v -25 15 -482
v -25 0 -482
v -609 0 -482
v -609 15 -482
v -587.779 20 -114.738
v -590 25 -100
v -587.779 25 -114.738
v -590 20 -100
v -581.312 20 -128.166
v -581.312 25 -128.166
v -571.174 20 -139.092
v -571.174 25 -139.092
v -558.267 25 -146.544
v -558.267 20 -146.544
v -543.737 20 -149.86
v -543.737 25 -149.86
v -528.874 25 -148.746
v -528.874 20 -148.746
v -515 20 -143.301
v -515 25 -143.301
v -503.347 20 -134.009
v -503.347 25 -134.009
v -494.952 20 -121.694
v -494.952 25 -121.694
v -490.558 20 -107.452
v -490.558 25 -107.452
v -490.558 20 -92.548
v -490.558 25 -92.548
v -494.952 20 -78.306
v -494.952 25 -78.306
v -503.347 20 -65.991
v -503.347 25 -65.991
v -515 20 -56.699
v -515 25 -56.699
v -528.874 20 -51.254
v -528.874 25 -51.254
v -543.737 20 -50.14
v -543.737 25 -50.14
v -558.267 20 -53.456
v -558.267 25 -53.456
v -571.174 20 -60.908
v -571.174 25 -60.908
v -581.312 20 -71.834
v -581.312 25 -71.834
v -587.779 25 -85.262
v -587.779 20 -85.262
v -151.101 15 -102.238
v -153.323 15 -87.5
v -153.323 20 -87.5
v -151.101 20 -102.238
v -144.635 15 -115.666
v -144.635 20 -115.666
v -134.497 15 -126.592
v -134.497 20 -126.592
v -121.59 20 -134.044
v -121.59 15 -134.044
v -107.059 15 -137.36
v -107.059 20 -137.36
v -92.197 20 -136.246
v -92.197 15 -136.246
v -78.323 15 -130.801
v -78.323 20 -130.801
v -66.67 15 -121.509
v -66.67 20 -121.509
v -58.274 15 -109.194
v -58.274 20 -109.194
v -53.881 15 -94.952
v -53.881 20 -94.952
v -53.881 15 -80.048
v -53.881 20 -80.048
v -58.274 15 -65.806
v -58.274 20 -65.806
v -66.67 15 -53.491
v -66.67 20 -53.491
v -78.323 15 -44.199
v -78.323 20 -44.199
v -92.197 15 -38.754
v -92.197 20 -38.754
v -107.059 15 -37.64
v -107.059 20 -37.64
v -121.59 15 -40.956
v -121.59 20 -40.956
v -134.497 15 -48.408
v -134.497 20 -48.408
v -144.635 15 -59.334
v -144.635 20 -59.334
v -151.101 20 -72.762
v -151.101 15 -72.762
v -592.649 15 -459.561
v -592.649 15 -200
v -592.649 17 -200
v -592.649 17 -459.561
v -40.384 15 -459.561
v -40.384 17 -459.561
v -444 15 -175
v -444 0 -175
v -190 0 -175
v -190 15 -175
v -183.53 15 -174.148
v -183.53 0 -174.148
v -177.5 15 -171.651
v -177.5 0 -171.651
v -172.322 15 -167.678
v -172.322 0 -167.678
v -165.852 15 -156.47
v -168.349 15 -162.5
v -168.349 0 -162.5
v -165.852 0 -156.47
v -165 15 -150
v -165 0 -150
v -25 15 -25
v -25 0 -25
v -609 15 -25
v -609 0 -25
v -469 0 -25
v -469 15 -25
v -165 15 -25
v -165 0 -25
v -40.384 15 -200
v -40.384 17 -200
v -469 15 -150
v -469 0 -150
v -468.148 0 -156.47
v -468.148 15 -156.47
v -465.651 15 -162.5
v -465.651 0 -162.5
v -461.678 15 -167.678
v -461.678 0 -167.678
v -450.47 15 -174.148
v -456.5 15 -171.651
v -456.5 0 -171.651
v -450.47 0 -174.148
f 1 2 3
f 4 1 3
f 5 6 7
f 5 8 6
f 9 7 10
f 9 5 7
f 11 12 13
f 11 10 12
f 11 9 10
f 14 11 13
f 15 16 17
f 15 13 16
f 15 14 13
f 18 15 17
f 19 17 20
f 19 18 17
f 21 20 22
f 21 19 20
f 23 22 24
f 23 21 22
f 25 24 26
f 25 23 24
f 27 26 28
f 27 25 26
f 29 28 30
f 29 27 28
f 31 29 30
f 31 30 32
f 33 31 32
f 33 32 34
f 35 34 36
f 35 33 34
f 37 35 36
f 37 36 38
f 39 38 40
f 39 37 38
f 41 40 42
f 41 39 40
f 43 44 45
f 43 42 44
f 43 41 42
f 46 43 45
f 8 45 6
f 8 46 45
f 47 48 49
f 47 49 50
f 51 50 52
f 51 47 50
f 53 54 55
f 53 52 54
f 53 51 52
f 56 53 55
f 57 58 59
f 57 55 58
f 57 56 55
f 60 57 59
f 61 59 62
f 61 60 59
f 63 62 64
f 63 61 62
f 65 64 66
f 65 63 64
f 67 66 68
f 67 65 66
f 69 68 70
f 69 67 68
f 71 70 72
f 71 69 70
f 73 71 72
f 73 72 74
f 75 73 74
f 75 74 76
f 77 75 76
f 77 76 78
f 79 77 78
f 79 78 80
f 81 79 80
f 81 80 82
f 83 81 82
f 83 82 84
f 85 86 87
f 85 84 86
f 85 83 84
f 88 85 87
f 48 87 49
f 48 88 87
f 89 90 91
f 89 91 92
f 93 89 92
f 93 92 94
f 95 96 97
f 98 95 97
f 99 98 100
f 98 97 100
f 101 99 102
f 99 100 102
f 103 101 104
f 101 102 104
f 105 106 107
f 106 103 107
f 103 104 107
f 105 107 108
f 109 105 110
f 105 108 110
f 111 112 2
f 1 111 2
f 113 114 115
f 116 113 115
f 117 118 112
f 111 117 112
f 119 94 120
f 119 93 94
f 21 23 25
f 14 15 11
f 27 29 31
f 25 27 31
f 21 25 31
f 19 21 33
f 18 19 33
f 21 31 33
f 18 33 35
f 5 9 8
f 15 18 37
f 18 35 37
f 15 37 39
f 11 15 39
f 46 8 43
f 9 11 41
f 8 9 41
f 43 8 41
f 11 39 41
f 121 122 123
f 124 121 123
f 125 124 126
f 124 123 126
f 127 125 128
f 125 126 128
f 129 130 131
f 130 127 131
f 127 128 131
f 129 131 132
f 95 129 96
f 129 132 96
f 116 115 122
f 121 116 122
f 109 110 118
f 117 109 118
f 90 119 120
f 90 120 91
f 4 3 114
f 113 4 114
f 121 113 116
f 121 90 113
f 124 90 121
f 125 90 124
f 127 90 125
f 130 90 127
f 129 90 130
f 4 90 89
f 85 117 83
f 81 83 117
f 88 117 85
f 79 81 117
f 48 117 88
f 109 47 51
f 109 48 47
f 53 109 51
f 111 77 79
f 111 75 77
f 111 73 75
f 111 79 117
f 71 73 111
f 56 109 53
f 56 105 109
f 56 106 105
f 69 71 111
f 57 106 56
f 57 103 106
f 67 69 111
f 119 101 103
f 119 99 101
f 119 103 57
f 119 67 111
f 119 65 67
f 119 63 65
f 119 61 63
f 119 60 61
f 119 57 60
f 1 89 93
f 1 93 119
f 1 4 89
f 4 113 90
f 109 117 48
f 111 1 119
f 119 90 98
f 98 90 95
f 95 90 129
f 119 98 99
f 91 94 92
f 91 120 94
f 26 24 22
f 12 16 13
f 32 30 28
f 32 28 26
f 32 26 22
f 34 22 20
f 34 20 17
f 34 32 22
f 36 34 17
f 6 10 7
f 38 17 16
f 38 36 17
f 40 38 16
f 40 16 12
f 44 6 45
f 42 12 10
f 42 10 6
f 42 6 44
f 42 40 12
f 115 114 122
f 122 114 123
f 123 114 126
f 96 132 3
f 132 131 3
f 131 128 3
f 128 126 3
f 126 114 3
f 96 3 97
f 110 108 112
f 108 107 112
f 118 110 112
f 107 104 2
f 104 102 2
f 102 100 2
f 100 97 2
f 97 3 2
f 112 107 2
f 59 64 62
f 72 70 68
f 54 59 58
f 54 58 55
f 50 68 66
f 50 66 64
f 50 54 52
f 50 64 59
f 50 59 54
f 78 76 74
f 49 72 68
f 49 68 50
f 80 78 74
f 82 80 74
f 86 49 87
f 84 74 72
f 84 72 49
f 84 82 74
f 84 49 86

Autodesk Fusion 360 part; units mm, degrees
sketch "Sketch1" plane through (0, 0, 0) normal (0, 1, 0) x (1, 0, 0)
  line L0 (-25, 25) -> (-25, 482)
  line L1 (-25, 482) -> (-609, 482)
  line L2 (-609, 482) -> (-609, 25)
  line L3 (-609, 25) -> (-469, 25)
  line L4 (-444, 175) -> (-190, 175)
  line L5 (-469, 25) -> (-469, 150)
  arc A0 (-444, 175) -> (-469, 150) centre (-444, 150) ccw
  line L6 (-165, 25) -> (-25, 25)
  line L7 (-165, 150) -> (-165, 25)
  arc A1 (-165, 150) -> (-190, 175) centre (-190, 150) ccw
  point P0 (-469, 175)
  point P1 (-165, 175)
  dimension "d1" = 457
  dimension "d2" = 584
  dimension "d3" = 457
  dimension "d5" = 304
  dimension "d7" = 25
  dimension "d8" = 25
extrude "Extrude1" add sketch "Sketch1" along normal blind 15 makes body 1
sketch "Sketch2" plane through (0, 15, 0) normal (0, 1, 0) x (-1, 0, 0)
  line L0 (165, -25) -> (25, -25)
  line L1 (25, -25) -> (25, -482)
  line L2 (25, -482) -> (609, -482)
  line L3 (609, -482) -> (609, -25)
  line L4 (609, -25) -> (469, -25)
  line L5 (469, -25) -> (469, -150)
  arc A0 (444, -175) -> (469, -150) centre (444, -150) ccw
  line L6 (444, -175) -> (190, -175)
  arc A1 (165, -150) -> (190, -175) centre (190, -150) ccw
  line L7 (165, -150) -> (165, -25)
  circle A2 centre (103.3226, -87.5) radius 50
  dimension "d11" = 100
extrude "Extrude2" add sketch "Sketch2" along normal blind 5 contours A2 bodies 1
sketch "Sketch3" plane through (0, 20, 0) normal (0, 1, 0) x (-1, 0, 0)
  circle A0 centre (103.3226, -87.5) radius 50
  circle A1 centre (540, -100) radius 50
  dimension "d14" = 100
extrude "Extrude3" add sketch "Sketch3" along normal blind 5 separate body contours A1 makes body 2
sketch "Sketch4" plane through (0, 15, 0) normal (0, 1, 0) x (-1, 0, 0)
  circle A0 centre (103.3226, -87.5) radius 50
  line L0 (165, -25) -> (25, -25)
  line L1 (25, -25) -> (25, -482)
  line L2 (25, -482) -> (609, -482)
  line L3 (609, -482) -> (609, -25)
  line L4 (609, -25) -> (469, -25)
  line L5 (469, -25) -> (469, -150)
  arc A1 (444, -175) -> (469, -150) centre (444, -150) ccw
  line L6 (444, -175) -> (190, -175)
  arc A2 (165, -150) -> (190, -175) centre (190, -150) ccw
  line L7 (165, -150) -> (165, -25)
  line L8 (592.6486, -459.5609) -> (40.3845, -459.5609)
  line L9 (40.3845, -459.5609) -> (40.3845, -199.9999)
  line L10 (40.3845, -199.9999) -> (592.6486, -199.9999)
  line L11 (592.6486, -199.9999) -> (592.6486, -459.5609)
  dimension "d17" = 259.561
extrude "Extrude4" add sketch "Sketch4" along normal blind 2 contours L8 L9 L10 L11 bodies 1
